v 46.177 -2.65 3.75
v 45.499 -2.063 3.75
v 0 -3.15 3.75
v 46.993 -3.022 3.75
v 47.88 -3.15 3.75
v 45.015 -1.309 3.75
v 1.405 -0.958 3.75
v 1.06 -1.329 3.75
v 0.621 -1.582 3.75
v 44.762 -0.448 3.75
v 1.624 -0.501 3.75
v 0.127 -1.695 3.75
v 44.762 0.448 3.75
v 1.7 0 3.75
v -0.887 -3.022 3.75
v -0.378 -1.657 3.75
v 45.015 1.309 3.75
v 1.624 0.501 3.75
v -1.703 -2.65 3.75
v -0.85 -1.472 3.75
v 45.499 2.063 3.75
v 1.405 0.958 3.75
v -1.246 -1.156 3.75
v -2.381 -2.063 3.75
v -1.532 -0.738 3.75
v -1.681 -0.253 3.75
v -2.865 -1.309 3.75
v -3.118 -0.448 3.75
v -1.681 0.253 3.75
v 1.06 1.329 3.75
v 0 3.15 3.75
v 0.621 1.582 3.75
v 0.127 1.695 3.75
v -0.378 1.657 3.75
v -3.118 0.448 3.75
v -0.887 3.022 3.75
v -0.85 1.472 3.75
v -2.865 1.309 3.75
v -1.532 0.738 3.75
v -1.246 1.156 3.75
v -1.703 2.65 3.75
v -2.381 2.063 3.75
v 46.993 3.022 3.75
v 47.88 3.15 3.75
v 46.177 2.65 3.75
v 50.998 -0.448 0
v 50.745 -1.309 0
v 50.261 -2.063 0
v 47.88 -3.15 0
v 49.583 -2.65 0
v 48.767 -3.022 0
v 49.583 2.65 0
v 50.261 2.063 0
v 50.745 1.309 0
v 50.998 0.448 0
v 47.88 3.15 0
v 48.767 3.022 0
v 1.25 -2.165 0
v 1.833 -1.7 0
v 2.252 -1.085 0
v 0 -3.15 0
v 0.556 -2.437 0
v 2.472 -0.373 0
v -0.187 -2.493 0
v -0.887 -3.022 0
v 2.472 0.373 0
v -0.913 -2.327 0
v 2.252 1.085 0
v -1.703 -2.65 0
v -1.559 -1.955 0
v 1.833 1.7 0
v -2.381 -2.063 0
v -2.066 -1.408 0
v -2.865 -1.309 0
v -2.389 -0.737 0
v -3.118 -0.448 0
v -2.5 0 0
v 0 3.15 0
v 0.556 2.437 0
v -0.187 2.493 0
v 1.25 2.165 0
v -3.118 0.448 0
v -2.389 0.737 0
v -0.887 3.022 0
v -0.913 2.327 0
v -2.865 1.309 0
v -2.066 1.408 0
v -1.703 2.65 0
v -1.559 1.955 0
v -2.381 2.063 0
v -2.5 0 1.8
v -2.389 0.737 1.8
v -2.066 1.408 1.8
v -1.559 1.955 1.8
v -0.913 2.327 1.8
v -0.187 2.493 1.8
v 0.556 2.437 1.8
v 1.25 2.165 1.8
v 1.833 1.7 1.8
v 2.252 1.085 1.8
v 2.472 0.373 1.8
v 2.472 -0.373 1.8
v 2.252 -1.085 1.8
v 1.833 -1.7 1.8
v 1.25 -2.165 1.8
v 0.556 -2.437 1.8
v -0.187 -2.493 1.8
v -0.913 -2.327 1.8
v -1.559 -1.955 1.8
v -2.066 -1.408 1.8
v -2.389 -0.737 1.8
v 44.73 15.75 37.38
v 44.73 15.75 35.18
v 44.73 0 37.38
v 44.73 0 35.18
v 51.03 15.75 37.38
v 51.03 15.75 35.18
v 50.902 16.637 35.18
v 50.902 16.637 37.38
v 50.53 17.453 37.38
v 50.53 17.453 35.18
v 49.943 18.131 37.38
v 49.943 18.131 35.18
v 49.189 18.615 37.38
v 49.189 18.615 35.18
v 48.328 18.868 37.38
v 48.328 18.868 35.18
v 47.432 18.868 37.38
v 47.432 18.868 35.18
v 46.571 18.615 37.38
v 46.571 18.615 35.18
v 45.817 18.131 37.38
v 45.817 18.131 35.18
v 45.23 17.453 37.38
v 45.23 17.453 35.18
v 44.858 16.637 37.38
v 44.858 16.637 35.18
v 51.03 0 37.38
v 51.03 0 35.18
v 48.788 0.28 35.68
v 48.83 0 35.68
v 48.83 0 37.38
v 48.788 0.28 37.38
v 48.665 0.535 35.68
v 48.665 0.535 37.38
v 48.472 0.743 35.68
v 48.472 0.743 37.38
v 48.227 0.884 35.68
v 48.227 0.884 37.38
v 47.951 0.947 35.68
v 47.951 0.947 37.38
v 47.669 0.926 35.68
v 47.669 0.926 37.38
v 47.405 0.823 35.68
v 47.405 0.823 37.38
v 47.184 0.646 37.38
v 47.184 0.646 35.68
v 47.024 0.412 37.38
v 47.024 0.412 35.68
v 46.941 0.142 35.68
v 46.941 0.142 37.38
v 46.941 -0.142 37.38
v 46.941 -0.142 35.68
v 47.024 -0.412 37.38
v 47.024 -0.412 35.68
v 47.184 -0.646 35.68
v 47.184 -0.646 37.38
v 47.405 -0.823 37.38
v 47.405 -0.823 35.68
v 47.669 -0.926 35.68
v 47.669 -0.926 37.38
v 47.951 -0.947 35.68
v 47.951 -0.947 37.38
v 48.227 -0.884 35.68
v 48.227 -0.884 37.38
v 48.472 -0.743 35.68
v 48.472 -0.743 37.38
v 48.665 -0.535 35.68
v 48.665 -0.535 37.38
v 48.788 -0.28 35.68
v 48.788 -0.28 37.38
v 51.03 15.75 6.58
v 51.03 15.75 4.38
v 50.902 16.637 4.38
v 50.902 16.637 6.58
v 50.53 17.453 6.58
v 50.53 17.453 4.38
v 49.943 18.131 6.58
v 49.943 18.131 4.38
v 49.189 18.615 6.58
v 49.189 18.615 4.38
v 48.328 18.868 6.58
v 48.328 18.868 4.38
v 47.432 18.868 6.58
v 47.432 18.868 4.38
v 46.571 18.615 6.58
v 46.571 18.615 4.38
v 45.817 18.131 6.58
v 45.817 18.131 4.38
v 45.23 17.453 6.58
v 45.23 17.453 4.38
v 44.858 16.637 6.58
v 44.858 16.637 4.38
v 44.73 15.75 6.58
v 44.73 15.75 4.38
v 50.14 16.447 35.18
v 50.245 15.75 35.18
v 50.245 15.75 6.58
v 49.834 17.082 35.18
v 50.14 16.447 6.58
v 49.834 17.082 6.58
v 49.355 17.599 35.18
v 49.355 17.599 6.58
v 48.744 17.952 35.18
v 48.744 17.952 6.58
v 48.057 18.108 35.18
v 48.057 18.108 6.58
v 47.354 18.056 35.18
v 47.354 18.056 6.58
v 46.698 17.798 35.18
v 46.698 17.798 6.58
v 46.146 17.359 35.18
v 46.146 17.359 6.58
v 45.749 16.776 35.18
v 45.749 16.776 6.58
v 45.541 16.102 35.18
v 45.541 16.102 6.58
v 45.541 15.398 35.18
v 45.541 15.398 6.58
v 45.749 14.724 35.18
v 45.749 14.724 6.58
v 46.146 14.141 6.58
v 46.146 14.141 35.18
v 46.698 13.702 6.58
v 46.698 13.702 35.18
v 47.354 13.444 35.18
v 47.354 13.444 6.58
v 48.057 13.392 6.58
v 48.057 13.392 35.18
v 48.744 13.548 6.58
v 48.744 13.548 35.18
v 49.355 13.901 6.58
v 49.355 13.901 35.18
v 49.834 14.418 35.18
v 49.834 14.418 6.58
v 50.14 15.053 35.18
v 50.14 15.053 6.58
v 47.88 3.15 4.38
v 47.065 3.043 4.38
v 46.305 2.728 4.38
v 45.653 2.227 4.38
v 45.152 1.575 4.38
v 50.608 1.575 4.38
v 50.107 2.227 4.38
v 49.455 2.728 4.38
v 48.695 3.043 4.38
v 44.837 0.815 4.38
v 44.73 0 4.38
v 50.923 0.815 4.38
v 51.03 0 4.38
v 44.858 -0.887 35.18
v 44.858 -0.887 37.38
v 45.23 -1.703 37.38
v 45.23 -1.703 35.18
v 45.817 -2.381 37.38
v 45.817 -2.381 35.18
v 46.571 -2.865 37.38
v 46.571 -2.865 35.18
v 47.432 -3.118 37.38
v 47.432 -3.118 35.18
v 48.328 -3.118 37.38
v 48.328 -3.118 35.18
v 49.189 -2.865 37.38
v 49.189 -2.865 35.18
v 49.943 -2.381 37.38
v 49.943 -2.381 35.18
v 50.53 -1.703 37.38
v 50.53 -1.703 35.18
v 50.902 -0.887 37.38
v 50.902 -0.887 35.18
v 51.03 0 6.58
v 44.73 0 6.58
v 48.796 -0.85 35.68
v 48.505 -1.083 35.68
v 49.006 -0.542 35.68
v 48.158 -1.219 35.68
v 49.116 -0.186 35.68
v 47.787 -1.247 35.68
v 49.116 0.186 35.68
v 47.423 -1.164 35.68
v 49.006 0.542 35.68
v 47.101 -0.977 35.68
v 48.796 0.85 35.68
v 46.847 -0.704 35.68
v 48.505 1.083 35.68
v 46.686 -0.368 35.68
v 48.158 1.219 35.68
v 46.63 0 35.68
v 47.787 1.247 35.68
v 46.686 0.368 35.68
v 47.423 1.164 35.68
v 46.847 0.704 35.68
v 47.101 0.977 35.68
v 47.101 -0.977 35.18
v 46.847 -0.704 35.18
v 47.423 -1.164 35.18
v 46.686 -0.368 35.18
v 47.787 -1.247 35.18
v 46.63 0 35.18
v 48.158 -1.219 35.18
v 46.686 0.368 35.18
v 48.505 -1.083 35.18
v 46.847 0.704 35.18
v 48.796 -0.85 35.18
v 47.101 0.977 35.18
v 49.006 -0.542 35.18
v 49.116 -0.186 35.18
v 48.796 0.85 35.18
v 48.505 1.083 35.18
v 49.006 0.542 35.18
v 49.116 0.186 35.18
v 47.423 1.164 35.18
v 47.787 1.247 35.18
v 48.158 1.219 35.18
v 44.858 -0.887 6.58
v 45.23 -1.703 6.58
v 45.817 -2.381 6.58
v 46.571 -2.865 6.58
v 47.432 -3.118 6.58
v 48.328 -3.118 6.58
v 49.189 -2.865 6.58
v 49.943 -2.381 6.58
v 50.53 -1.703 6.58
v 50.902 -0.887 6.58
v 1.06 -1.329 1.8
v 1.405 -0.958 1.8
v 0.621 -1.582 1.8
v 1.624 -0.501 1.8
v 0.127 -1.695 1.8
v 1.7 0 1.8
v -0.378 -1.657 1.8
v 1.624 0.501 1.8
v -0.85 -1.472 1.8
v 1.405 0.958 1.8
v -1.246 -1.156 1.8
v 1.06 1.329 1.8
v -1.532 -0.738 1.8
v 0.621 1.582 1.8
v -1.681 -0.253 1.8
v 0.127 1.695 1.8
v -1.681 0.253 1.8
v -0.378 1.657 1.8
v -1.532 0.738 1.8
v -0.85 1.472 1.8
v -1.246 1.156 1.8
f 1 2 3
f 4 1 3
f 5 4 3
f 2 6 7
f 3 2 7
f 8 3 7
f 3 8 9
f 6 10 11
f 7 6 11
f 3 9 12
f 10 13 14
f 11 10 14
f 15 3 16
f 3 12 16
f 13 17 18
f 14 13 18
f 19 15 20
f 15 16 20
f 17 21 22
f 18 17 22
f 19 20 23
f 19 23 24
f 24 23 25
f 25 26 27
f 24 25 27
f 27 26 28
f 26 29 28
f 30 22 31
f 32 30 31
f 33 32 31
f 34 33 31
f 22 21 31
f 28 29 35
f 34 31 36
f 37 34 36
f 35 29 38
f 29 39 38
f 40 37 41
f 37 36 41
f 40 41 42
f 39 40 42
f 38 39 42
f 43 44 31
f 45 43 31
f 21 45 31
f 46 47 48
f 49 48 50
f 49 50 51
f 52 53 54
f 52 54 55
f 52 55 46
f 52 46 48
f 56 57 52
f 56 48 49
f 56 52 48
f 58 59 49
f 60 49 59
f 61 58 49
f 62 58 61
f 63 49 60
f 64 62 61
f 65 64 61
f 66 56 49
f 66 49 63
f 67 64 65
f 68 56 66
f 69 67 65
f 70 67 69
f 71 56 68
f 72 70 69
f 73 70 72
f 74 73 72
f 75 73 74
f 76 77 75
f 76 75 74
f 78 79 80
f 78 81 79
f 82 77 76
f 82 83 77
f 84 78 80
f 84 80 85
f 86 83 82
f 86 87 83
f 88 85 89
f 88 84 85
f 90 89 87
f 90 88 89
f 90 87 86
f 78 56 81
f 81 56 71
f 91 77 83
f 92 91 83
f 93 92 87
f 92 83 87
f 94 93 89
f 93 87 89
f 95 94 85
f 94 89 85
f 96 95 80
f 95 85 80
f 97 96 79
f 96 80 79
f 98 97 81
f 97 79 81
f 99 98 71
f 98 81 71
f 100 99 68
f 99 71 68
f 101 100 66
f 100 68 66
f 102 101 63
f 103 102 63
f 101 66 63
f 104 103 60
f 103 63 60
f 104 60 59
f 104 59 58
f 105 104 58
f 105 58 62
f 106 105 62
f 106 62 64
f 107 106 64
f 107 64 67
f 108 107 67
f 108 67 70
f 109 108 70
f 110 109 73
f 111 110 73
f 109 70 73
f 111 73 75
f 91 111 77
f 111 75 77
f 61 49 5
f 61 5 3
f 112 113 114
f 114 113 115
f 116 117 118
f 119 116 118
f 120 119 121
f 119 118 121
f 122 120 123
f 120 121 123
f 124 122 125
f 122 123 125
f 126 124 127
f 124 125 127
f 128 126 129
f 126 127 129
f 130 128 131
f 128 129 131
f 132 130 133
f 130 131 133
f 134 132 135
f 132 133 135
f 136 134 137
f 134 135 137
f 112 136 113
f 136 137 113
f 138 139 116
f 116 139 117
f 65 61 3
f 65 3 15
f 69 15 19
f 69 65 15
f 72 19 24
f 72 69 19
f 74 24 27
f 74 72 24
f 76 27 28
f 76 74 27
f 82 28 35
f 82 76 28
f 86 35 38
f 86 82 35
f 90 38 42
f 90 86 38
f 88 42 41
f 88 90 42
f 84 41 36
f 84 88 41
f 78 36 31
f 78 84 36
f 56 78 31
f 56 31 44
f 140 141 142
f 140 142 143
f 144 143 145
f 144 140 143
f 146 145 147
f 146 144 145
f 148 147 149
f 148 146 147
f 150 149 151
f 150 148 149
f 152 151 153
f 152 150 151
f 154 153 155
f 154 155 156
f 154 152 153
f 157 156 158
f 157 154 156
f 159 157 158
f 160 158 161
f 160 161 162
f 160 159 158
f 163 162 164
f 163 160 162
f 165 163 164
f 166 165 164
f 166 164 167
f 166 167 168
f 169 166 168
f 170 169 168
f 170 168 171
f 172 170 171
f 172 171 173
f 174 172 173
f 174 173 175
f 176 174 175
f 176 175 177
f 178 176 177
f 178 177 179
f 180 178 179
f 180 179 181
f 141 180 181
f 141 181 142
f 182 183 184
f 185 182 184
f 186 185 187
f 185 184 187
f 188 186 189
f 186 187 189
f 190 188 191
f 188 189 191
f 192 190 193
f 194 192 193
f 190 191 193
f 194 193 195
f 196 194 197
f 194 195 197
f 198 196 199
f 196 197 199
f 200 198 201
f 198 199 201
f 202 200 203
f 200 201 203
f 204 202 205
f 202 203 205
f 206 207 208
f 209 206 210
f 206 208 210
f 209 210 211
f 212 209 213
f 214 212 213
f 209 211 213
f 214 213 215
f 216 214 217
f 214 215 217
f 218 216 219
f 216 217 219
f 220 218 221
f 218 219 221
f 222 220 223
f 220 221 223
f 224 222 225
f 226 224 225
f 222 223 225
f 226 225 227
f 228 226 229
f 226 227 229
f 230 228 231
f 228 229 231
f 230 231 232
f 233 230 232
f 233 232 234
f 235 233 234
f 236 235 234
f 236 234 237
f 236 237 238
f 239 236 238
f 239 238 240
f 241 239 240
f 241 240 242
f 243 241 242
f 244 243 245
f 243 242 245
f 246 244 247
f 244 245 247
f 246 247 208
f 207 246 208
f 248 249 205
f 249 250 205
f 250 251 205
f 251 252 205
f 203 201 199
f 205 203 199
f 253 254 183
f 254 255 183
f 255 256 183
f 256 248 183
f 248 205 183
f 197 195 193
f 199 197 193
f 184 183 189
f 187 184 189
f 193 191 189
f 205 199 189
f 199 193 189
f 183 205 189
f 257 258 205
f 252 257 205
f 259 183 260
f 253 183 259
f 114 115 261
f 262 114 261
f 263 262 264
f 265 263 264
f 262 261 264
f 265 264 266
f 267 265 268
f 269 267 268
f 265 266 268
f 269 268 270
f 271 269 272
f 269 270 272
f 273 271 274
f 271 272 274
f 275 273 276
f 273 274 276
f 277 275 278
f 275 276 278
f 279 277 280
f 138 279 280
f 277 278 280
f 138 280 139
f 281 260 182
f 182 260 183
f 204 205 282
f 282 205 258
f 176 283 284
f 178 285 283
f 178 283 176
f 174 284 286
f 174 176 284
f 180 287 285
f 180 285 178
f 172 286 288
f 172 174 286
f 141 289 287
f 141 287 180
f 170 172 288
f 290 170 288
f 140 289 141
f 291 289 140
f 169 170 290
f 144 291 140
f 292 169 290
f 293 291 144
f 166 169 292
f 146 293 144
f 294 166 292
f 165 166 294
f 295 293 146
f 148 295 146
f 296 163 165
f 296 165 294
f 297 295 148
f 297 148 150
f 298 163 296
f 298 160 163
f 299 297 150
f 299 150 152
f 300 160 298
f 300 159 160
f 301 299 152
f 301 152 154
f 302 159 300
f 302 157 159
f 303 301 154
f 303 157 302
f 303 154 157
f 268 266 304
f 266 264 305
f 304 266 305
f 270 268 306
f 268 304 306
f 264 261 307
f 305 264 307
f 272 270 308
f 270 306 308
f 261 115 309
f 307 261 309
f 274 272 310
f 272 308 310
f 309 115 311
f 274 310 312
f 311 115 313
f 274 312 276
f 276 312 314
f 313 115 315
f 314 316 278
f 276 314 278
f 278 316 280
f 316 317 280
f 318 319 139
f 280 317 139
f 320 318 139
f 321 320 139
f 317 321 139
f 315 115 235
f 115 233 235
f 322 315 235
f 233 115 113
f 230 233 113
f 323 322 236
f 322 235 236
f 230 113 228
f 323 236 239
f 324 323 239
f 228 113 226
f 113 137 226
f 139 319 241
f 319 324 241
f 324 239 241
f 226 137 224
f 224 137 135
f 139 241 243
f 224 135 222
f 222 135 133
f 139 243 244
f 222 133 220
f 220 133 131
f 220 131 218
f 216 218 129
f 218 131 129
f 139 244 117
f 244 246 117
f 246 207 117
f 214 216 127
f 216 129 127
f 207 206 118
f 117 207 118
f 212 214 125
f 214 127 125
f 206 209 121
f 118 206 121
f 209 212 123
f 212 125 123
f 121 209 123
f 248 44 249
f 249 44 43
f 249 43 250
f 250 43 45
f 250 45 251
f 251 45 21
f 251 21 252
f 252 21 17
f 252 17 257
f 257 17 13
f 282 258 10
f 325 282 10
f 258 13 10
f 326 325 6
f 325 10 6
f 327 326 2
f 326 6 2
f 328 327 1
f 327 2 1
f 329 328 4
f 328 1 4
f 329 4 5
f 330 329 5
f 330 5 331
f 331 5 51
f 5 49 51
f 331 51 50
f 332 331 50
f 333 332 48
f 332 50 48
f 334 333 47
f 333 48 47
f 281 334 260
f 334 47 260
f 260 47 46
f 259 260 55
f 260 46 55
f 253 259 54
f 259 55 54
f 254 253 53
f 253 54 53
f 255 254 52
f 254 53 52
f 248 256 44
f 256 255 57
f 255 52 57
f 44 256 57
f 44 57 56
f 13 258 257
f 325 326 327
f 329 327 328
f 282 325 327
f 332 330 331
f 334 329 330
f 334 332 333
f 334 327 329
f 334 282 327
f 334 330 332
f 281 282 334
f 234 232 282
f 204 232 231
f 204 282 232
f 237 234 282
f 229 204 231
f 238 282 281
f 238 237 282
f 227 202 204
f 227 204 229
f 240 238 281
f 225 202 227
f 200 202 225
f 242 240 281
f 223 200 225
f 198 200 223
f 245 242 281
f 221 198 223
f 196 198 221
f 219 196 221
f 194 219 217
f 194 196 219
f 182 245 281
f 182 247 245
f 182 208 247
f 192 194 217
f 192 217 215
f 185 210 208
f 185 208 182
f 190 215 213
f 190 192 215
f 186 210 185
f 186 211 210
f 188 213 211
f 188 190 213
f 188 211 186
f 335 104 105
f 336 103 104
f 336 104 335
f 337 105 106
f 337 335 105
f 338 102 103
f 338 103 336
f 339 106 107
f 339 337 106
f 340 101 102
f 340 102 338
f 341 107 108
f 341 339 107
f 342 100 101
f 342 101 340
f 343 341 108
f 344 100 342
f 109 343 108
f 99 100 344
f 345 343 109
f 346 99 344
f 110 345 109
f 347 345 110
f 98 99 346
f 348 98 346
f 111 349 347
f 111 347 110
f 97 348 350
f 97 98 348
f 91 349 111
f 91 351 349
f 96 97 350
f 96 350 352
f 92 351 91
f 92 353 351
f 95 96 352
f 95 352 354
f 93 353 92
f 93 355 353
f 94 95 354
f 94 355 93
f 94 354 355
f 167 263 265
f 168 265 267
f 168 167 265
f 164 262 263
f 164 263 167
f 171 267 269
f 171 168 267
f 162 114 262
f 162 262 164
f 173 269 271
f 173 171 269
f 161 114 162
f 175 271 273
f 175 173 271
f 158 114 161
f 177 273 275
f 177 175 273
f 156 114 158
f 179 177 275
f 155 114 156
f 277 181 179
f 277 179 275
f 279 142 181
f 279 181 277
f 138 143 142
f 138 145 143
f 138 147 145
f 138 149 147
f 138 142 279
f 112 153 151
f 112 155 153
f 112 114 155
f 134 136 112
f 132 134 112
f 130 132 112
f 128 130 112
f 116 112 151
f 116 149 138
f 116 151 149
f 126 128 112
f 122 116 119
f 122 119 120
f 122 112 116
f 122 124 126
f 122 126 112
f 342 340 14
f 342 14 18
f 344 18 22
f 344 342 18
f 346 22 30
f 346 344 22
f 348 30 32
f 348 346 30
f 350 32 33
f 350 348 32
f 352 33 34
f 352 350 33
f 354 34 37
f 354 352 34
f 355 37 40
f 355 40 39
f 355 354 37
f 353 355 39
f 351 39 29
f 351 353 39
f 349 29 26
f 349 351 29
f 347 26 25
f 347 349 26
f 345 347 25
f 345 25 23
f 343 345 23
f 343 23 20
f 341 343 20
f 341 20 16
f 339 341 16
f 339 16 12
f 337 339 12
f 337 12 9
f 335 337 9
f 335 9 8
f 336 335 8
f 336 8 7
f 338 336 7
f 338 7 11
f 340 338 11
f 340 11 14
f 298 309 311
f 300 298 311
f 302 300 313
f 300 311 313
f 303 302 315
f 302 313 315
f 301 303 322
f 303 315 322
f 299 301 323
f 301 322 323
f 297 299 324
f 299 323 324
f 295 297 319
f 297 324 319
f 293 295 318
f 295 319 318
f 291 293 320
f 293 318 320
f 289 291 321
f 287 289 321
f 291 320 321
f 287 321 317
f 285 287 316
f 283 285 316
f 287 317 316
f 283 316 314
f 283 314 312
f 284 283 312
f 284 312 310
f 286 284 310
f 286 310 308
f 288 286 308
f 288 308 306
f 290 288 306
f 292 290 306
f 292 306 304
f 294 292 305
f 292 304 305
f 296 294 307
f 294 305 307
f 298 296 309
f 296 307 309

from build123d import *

# Parameters (mm, degrees)
CROQUIS1_R              = 1.7
SALIENTE_EXTRUIR1_DEPTH = 3.75
CROQUIS2_R              = 3.15
SALIENTE_EXTRUIR2_DEPTH = 0.63
SALIENTE_EXTRUIR3_DEPTH = 2.2
CROQUIS4_R              = 2.365
SALIENTE_EXTRUIR4_DEPTH = 28.6
CROQUIS5_R              = 0.95
SALIENTE_EXTRUIR5_DEPTH = 2.2
CROQUIS6_R              = 1.25
CORTAR_EXTRUIR1_DEPTH   = 0.5
CROQUIS7_R              = 2.5
CORTAR_EXTRUIR2_DEPTH   = 1.8


with BuildPart() as part:
    # Croquis1 → Saliente-Extruir1 (new body)
    with BuildSketch(Plane.XY):
        with BuildLine():
            Line((0, 3.15), (47.88, 3.15))
            ThreePointArc((47.88, 3.15), (51.03, 0), (47.88, -3.15))
            Line((47.88, -3.15), (0, -3.15))
            ThreePointArc((0, -3.15), (-3.15, 0), (0, 3.15))
        make_face()
        Circle(CROQUIS1_R, mode=Mode.SUBTRACT)
    extrude(amount=SALIENTE_EXTRUIR1_DEPTH)

    # Croquis2 → Saliente-Extruir2 (add)
    with BuildSketch(Plane.XY.offset(3.75)):
        with Locations(Location((47.88, 0, 0), (0, 0, 90))):
            Circle(CROQUIS2_R)
    extrude(amount=SALIENTE_EXTRUIR2_DEPTH)

    # Croquis3 → Saliente-Extruir3 (add)
    with BuildSketch(Plane.XY.offset(4.38)):
        with BuildLine():
            Line((44.73, 15.75), (44.73, 0))
            ThreePointArc((44.73, 0), (47.88, -3.15), (51.03, 0))
            Line((51.03, 0), (51.03, 15.75))
            ThreePointArc((51.03, 15.75), (47.88, 18.9), (44.73, 15.75))
        make_face()
    extrude(amount=SALIENTE_EXTRUIR3_DEPTH)

    # Croquis4 → Saliente-Extruir4 (add)
    with BuildSketch(Plane.XY.offset(6.58)):
        with Locations((47.88, 15.75)):
            Circle(CROQUIS4_R)
    extrude(amount=SALIENTE_EXTRUIR4_DEPTH)

    # Croquis5 → Saliente-Extruir5 (add)
    with BuildSketch(Plane.XY.offset(35.18)):
        with BuildLine():
            Line((44.73, 15.75), (44.73, 0))
            ThreePointArc((44.73, 0), (47.88, -3.15), (51.03, 0))
            Line((51.03, 0), (51.03, 15.75))
            ThreePointArc((51.03, 15.75), (47.88, 18.9), (44.73, 15.75))
        make_face()
        with Locations((47.88, 0)):
            Circle(CROQUIS5_R, mode=Mode.SUBTRACT)
    extrude(amount=SALIENTE_EXTRUIR5_DEPTH)

    # Croquis6 → Cortar-Extruir1 (cut)
    with BuildSketch(Plane(origin=(0, 0, 35.18), x_dir=(-1, 0, 0), z_dir=(0, 0, -1))):
        with Locations((-47.88, 0)):
            Circle(CROQUIS6_R)
    extrude(amount=-CORTAR_EXTRUIR1_DEPTH, mode=Mode.SUBTRACT)

    # Croquis7 → Cortar-Extruir2 (cut)
    with BuildSketch(Plane(origin=(0, 0, 0), x_dir=(-1, 0, 0), z_dir=(0, 0, -1))):
        Circle(CROQUIS7_R)
    extrude(amount=-CORTAR_EXTRUIR2_DEPTH, mode=Mode.SUBTRACT)


solid = part.part
